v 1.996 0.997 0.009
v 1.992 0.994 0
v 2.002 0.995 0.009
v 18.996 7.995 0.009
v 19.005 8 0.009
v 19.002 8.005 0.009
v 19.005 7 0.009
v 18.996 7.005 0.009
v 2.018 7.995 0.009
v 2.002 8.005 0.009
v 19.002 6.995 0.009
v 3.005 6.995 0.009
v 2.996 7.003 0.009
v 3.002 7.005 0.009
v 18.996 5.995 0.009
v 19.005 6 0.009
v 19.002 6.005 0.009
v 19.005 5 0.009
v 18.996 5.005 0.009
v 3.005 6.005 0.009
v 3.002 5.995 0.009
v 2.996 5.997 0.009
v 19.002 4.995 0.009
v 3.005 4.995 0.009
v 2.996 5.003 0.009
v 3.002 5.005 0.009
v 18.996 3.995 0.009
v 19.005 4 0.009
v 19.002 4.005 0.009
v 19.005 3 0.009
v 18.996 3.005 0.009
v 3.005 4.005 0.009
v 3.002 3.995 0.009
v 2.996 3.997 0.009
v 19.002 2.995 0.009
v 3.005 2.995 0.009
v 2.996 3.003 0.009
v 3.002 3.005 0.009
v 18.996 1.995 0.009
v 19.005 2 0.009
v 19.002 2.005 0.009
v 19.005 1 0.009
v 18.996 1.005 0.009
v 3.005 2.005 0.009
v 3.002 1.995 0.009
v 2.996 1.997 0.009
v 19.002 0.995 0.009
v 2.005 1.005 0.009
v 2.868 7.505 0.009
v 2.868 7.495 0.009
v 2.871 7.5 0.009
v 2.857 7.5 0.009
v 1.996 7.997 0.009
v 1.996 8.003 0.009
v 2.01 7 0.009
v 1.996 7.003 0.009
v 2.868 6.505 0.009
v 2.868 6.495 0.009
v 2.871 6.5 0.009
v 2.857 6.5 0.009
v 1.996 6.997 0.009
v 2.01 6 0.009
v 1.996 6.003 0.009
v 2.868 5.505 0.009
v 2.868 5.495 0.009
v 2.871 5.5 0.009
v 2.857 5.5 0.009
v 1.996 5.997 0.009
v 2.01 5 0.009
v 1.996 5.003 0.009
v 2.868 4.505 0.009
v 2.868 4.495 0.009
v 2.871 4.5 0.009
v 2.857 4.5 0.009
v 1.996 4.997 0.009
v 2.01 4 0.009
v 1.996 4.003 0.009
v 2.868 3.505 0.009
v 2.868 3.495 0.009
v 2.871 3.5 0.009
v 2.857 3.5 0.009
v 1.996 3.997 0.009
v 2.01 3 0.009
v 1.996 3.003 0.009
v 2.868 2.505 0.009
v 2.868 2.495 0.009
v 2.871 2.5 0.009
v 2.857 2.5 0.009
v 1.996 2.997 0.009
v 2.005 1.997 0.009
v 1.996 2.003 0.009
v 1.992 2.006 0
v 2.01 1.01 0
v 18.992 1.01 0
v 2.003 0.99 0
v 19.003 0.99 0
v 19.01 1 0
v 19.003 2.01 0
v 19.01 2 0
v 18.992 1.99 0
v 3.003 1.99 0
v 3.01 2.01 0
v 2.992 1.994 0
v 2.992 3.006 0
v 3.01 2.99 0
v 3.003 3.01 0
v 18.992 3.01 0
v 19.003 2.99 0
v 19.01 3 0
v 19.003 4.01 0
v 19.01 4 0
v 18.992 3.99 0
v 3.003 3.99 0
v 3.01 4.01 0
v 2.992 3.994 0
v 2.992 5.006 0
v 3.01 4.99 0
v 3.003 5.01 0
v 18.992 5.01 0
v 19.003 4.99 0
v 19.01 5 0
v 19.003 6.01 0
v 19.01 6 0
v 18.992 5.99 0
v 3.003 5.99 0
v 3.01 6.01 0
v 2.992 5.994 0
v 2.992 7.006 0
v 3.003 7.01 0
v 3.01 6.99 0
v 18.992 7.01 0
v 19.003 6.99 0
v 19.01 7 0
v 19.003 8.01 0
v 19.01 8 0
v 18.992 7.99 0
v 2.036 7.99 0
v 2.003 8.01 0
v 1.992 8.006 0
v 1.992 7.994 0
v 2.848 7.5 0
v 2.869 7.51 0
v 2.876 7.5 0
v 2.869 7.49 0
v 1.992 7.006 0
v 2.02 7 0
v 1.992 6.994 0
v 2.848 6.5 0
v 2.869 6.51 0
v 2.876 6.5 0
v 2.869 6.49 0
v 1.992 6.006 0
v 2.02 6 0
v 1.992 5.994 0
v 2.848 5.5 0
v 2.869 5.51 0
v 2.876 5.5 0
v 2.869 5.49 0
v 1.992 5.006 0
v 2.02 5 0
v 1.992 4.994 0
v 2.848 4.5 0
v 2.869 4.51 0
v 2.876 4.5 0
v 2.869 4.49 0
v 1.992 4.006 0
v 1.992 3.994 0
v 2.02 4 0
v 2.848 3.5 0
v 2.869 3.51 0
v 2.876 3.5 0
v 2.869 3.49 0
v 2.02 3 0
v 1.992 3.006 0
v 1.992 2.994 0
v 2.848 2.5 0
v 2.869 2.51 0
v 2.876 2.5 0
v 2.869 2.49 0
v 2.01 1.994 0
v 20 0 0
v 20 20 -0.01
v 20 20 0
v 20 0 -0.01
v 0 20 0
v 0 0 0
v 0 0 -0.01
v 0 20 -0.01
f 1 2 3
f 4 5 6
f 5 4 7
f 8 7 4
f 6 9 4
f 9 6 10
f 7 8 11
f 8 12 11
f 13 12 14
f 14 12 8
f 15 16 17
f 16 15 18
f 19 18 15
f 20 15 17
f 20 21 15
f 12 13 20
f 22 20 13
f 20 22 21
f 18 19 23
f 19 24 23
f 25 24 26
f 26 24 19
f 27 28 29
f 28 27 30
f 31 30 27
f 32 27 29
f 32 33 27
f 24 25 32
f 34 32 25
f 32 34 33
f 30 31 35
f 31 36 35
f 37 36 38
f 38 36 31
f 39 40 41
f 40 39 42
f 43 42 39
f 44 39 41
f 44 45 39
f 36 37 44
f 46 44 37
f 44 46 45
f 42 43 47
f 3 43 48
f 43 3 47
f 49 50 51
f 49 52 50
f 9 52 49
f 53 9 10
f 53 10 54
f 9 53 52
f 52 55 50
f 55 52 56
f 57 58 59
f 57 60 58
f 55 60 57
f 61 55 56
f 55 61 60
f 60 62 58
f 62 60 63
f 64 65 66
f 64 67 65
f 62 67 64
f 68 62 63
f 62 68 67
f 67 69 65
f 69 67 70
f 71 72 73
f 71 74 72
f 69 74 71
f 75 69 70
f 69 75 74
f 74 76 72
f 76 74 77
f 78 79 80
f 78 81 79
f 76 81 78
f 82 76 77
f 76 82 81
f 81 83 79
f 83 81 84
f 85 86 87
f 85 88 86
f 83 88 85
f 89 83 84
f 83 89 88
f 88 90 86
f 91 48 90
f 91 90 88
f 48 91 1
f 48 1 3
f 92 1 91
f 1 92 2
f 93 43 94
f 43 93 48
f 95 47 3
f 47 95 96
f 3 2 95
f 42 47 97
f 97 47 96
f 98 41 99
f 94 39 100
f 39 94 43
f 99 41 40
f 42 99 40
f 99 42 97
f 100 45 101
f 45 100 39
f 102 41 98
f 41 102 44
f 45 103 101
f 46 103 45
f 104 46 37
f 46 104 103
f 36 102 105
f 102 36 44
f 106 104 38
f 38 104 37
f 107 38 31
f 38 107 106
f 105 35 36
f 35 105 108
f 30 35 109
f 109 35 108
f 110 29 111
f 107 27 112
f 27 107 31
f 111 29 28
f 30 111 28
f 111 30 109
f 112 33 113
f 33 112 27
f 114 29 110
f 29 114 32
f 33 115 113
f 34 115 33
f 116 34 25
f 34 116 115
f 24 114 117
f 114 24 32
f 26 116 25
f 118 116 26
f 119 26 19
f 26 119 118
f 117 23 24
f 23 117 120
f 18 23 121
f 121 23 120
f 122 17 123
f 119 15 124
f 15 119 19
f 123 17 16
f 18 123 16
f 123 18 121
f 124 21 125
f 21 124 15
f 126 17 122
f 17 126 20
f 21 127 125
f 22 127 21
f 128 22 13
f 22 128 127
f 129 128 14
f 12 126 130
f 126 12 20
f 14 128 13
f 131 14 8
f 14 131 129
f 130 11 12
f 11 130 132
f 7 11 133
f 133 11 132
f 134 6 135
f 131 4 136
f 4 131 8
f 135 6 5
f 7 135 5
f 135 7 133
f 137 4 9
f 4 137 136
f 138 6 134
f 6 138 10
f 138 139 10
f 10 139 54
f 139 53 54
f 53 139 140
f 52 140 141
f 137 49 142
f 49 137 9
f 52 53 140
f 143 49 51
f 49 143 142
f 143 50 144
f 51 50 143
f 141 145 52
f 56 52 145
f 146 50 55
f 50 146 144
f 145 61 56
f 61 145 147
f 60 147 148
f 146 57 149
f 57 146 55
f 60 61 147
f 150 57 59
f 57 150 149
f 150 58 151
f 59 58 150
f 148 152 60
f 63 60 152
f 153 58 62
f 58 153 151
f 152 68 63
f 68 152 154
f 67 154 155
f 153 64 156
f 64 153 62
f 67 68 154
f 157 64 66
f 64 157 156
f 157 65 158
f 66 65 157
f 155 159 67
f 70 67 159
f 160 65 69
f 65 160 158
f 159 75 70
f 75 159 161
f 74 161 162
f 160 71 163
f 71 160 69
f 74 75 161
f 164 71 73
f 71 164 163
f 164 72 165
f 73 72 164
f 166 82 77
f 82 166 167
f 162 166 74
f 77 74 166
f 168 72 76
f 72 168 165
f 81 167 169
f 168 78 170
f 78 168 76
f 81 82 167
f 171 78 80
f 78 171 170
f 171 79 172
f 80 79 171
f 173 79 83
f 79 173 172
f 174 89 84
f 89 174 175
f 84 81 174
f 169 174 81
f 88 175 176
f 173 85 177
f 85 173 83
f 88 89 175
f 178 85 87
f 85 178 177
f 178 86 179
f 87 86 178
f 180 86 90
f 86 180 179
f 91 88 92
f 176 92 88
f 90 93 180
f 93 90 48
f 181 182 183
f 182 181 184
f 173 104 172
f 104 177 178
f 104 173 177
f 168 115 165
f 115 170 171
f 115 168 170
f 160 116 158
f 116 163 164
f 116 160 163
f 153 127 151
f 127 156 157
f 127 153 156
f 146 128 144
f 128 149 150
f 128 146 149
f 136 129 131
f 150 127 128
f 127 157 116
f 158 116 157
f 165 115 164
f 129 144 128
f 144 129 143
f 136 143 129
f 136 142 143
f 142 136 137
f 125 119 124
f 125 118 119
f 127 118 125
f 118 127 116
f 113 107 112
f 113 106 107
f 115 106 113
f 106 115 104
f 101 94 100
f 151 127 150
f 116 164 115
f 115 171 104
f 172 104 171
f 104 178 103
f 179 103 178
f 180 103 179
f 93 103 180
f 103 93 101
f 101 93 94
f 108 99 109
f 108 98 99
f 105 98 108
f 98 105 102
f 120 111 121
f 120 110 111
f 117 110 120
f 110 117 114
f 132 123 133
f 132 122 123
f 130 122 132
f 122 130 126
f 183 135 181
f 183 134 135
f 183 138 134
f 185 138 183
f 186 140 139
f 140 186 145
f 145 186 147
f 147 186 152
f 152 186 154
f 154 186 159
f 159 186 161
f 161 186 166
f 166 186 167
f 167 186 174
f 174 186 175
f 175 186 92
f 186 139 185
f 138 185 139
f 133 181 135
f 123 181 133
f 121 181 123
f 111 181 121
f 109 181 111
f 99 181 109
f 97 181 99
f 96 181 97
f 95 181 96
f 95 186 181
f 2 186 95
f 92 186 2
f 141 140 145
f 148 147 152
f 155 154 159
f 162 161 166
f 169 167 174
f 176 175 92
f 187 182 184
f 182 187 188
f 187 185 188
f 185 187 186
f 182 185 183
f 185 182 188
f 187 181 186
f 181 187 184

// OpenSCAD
hull(){
    translate([2, 1]) sphere(0.01);
    translate([3, 1]) sphere(0.01);
}
hull(){
    translate([3, 1]) sphere(0.01);
    translate([4, 1]) sphere(0.01);
}
hull(){
    translate([4, 1]) sphere(0.01);
    translate([5, 1]) sphere(0.01);
}
hull(){
    translate([5, 1]) sphere(0.01);
    translate([6, 1]) sphere(0.01);
}
hull(){
    translate([6, 1]) sphere(0.01);
    translate([7, 1]) sphere(0.01);
}
hull(){
    translate([7, 1]) sphere(0.01);
    translate([8, 1]) sphere(0.01);
}
hull(){
    translate([8, 1]) sphere(0.01);
    translate([9, 1]) sphere(0.01);
}
hull(){
    translate([9, 1]) sphere(0.01);
    translate([10, 1]) sphere(0.01);
}
hull(){
    translate([10, 1]) sphere(0.01);
    translate([11, 1]) sphere(0.01);
}
hull(){
    translate([11, 1]) sphere(0.01);
    translate([12, 1]) sphere(0.01);
}
hull(){
    translate([12, 1]) sphere(0.01);
    translate([13, 1]) sphere(0.01);
}
hull(){
    translate([13, 1]) sphere(0.01);
    translate([14, 1]) sphere(0.01);
}
hull(){
    translate([14, 1]) sphere(0.01);
    translate([15, 1]) sphere(0.01);
}
hull(){
    translate([15, 1]) sphere(0.01);
    translate([16, 1]) sphere(0.01);
}
hull(){
    translate([16, 1]) sphere(0.01);
    translate([17, 1]) sphere(0.01);
}
hull(){
    translate([17, 1]) sphere(0.01);
    translate([18, 1]) sphere(0.01);
}
hull(){
    translate([18, 1]) sphere(0.01);
    translate([19, 1]) sphere(0.01);
}
hull(){
    translate([19, 1]) sphere(0.01);
    translate([19, 2]) sphere(0.01);
}
hull(){
    translate([19, 2]) sphere(0.01);
    translate([18, 2]) sphere(0.01);
}
hull(){
    translate([18, 2]) sphere(0.01);
    translate([17, 2]) sphere(0.01);
}
hull(){
    translate([17, 2]) sphere(0.01);
    translate([16, 2]) sphere(0.01);
}
hull(){
    translate([16, 2]) sphere(0.01);
    translate([15, 2]) sphere(0.01);
}
hull(){
    translate([15, 2]) sphere(0.01);
    translate([14, 2]) sphere(0.01);
}
hull(){
    translate([14, 2]) sphere(0.01);
    translate([13, 2]) sphere(0.01);
}
hull(){
    translate([13, 2]) sphere(0.01);
    translate([12, 2]) sphere(0.01);
}
hull(){
    translate([12, 2]) sphere(0.01);
    translate([11, 2]) sphere(0.01);
}
hull(){
    translate([11, 2]) sphere(0.01);
    translate([10, 2]) sphere(0.01);
}
hull(){
    translate([10, 2]) sphere(0.01);
    translate([9, 2]) sphere(0.01);
}
hull(){
    translate([9, 2]) sphere(0.01);
    translate([8, 2]) sphere(0.01);
}
hull(){
    translate([8, 2]) sphere(0.01);
    translate([7, 2]) sphere(0.01);
}
hull(){
    translate([7, 2]) sphere(0.01);
    translate([6, 2]) sphere(0.01);
}
hull(){
    translate([6, 2]) sphere(0.01);
    translate([5, 2]) sphere(0.01);
}
hull(){
    translate([5, 2]) sphere(0.01);
    translate([4, 2]) sphere(0.01);
}
hull(){
    translate([4, 2]) sphere(0.01);
    translate([3, 2]) sphere(0.01);
}
hull(){
    translate([3, 2]) sphere(0.01);
    translate([3, 3]) sphere(0.01);
}
hull(){
    translate([3, 3]) sphere(0.01);
    translate([4, 3]) sphere(0.01);
}
hull(){
    translate([4, 3]) sphere(0.01);
    translate([5, 3]) sphere(0.01);
}
hull(){
    translate([5, 3]) sphere(0.01);
    translate([6, 3]) sphere(0.01);
}
hull(){
    translate([6, 3]) sphere(0.01);
    translate([7, 3]) sphere(0.01);
}
hull(){
    translate([7, 3]) sphere(0.01);
    translate([8, 3]) sphere(0.01);
}
hull(){
    translate([8, 3]) sphere(0.01);
    translate([9, 3]) sphere(0.01);
}
hull(){
    translate([9, 3]) sphere(0.01);
    translate([10, 3]) sphere(0.01);
}
hull(){
    translate([10, 3]) sphere(0.01);
    translate([11, 3]) sphere(0.01);
}
hull(){
    translate([11, 3]) sphere(0.01);
    translate([12, 3]) sphere(0.01);
}
hull(){
    translate([12, 3]) sphere(0.01);
    translate([13, 3]) sphere(0.01);
}
hull(){
    translate([13, 3]) sphere(0.01);
    translate([14, 3]) sphere(0.01);
}
hull(){
    translate([14, 3]) sphere(0.01);
    translate([15, 3]) sphere(0.01);
}
hull(){
    translate([15, 3]) sphere(0.01);
    translate([16, 3]) sphere(0.01);
}
hull(){
    translate([16, 3]) sphere(0.01);
    translate([17, 3]) sphere(0.01);
}
hull(){
    translate([17, 3]) sphere(0.01);
    translate([18, 3]) sphere(0.01);
}
hull(){
    translate([18, 3]) sphere(0.01);
    translate([19, 3]) sphere(0.01);
}
hull(){
    translate([19, 3]) sphere(0.01);
    translate([19, 4]) sphere(0.01);
}
hull(){
    translate([19, 4]) sphere(0.01);
    translate([18, 4]) sphere(0.01);
}
hull(){
    translate([18, 4]) sphere(0.01);
    translate([17, 4]) sphere(0.01);
}
hull(){
    translate([17, 4]) sphere(0.01);
    translate([16, 4]) sphere(0.01);
}
hull(){
    translate([16, 4]) sphere(0.01);
    translate([15, 4]) sphere(0.01);
}
hull(){
    translate([15, 4]) sphere(0.01);
    translate([14, 4]) sphere(0.01);
}
hull(){
    translate([14, 4]) sphere(0.01);
    translate([13, 4]) sphere(0.01);
}
hull(){
    translate([13, 4]) sphere(0.01);
    translate([12, 4]) sphere(0.01);
}
hull(){
    translate([12, 4]) sphere(0.01);
    translate([11, 4]) sphere(0.01);
}
hull(){
    translate([11, 4]) sphere(0.01);
    translate([10, 4]) sphere(0.01);
}
hull(){
    translate([10, 4]) sphere(0.01);
    translate([9, 4]) sphere(0.01);
}
hull(){
    translate([9, 4]) sphere(0.01);
    translate([8, 4]) sphere(0.01);
}
hull(){
    translate([8, 4]) sphere(0.01);
    translate([7, 4]) sphere(0.01);
}
hull(){
    translate([7, 4]) sphere(0.01);
    translate([6, 4]) sphere(0.01);
}
hull(){
    translate([6, 4]) sphere(0.01);
    translate([5, 4]) sphere(0.01);
}
hull(){
    translate([5, 4]) sphere(0.01);
    translate([4, 4]) sphere(0.01);
}
hull(){
    translate([4, 4]) sphere(0.01);
    translate([3, 4]) sphere(0.01);
}
hull(){
    translate([3, 4]) sphere(0.01);
    translate([3, 5]) sphere(0.01);
}
hull(){
    translate([3, 5]) sphere(0.01);
    translate([4, 5]) sphere(0.01);
}
hull(){
    translate([4, 5]) sphere(0.01);
    translate([5, 5]) sphere(0.01);
}
hull(){
    translate([5, 5]) sphere(0.01);
    translate([6, 5]) sphere(0.01);
}
hull(){
    translate([6, 5]) sphere(0.01);
    translate([7, 5]) sphere(0.01);
}
hull(){
    translate([7, 5]) sphere(0.01);
    translate([8, 5]) sphere(0.01);
}
hull(){
    translate([8, 5]) sphere(0.01);
    translate([9, 5]) sphere(0.01);
}
hull(){
    translate([9, 5]) sphere(0.01);
    translate([10, 5]) sphere(0.01);
}
hull(){
    translate([10, 5]) sphere(0.01);
    translate([11, 5]) sphere(0.01);
}
hull(){
    translate([11, 5]) sphere(0.01);
    translate([12, 5]) sphere(0.01);
}
hull(){
    translate([12, 5]) sphere(0.01);
    translate([13, 5]) sphere(0.01);
}
hull(){
    translate([13, 5]) sphere(0.01);
    translate([14, 5]) sphere(0.01);
}
hull(){
    translate([14, 5]) sphere(0.01);
    translate([15, 5]) sphere(0.01);
}
hull(){
    translate([15, 5]) sphere(0.01);
    translate([16, 5]) sphere(0.01);
}
hull(){
    translate([16, 5]) sphere(0.01);
    translate([17, 5]) sphere(0.01);
}
hull(){
    translate([17, 5]) sphere(0.01);
    translate([18, 5]) sphere(0.01);
}
hull(){
    translate([18, 5]) sphere(0.01);
    translate([19, 5]) sphere(0.01);
}
hull(){
    translate([19, 5]) sphere(0.01);
    translate([19, 6]) sphere(0.01);
}
hull(){
    translate([19, 6]) sphere(0.01);
    translate([18, 6]) sphere(0.01);
}
hull(){
    translate([18, 6]) sphere(0.01);
    translate([17, 6]) sphere(0.01);
}
hull(){
    translate([17, 6]) sphere(0.01);
    translate([16, 6]) sphere(0.01);
}
hull(){
    translate([16, 6]) sphere(0.01);
    translate([15, 6]) sphere(0.01);
}
hull(){
    translate([15, 6]) sphere(0.01);
    translate([14, 6]) sphere(0.01);
}
hull(){
    translate([14, 6]) sphere(0.01);
    translate([13, 6]) sphere(0.01);
}
hull(){
    translate([13, 6]) sphere(0.01);
    translate([12, 6]) sphere(0.01);
}
hull(){
    translate([12, 6]) sphere(0.01);
    translate([11, 6]) sphere(0.01);
}
hull(){
    translate([11, 6]) sphere(0.01);
    translate([10, 6]) sphere(0.01);
}
hull(){
    translate([10, 6]) sphere(0.01);
    translate([9, 6]) sphere(0.01);
}
hull(){
    translate([9, 6]) sphere(0.01);
    translate([8, 6]) sphere(0.01);
}
hull(){
    translate([8, 6]) sphere(0.01);
    translate([7, 6]) sphere(0.01);
}
hull(){
    translate([7, 6]) sphere(0.01);
    translate([6, 6]) sphere(0.01);
}
hull(){
    translate([6, 6]) sphere(0.01);
    translate([5, 6]) sphere(0.01);
}
hull(){
    translate([5, 6]) sphere(0.01);
    translate([4, 6]) sphere(0.01);
}
hull(){
    translate([4, 6]) sphere(0.01);
    translate([3, 6]) sphere(0.01);
}
hull(){
    translate([3, 6]) sphere(0.01);
    translate([3, 7]) sphere(0.01);
}
hull(){
    translate([3, 7]) sphere(0.01);
    translate([4, 7]) sphere(0.01);
}
hull(){
    translate([4, 7]) sphere(0.01);
    translate([5, 7]) sphere(0.01);
}
hull(){
    translate([5, 7]) sphere(0.01);
    translate([6, 7]) sphere(0.01);
}
hull(){
    translate([6, 7]) sphere(0.01);
    translate([7, 7]) sphere(0.01);
}
hull(){
    translate([7, 7]) sphere(0.01);
    translate([8, 7]) sphere(0.01);
}
hull(){
    translate([8, 7]) sphere(0.01);
    translate([9, 7]) sphere(0.01);
}
hull(){
    translate([9, 7]) sphere(0.01);
    translate([10, 7]) sphere(0.01);
}
hull(){
    translate([10, 7]) sphere(0.01);
    translate([11, 7]) sphere(0.01);
}
hull(){
    translate([11, 7]) sphere(0.01);
    translate([12, 7]) sphere(0.01);
}
hull(){
    translate([12, 7]) sphere(0.01);
    translate([13, 7]) sphere(0.01);
}
hull(){
    translate([13, 7]) sphere(0.01);
    translate([14, 7]) sphere(0.01);
}
hull(){
    translate([14, 7]) sphere(0.01);
    translate([15, 7]) sphere(0.01);
}
hull(){
    translate([15, 7]) sphere(0.01);
    translate([16, 7]) sphere(0.01);
}
hull(){
    translate([16, 7]) sphere(0.01);
    translate([17, 7]) sphere(0.01);
}
hull(){
    translate([17, 7]) sphere(0.01);
    translate([18, 7]) sphere(0.01);
}
hull(){
    translate([18, 7]) sphere(0.01);
    translate([19, 7]) sphere(0.01);
}
hull(){
    translate([19, 7]) sphere(0.01);
    translate([19, 8]) sphere(0.01);
}
hull(){
    translate([19, 8]) sphere(0.01);
    translate([18, 8]) sphere(0.01);
}
hull(){
    translate([18, 8]) sphere(0.01);
    translate([17, 8]) sphere(0.01);
}
hull(){
    translate([17, 8]) sphere(0.01);
    translate([16, 8]) sphere(0.01);
}
hull(){
    translate([16, 8]) sphere(0.01);
    translate([15, 8]) sphere(0.01);
}
hull(){
    translate([15, 8]) sphere(0.01);
    translate([14, 8]) sphere(0.01);
}
hull(){
    translate([14, 8]) sphere(0.01);
    translate([13, 8]) sphere(0.01);
}
hull(){
    translate([13, 8]) sphere(0.01);
    translate([12, 8]) sphere(0.01);
}
hull(){
    translate([12, 8]) sphere(0.01);
    translate([11, 8]) sphere(0.01);
}
hull(){
    translate([11, 8]) sphere(0.01);
    translate([10, 8]) sphere(0.01);
}
hull(){
    translate([10, 8]) sphere(0.01);
    translate([9, 8]) sphere(0.01);
}
hull(){
    translate([9, 8]) sphere(0.01);
    translate([8, 8]) sphere(0.01);
}
hull(){
    translate([8, 8]) sphere(0.01);
    translate([7, 8]) sphere(0.01);
}
hull(){
    translate([7, 8]) sphere(0.01);
    translate([6, 8]) sphere(0.01);
}
hull(){
    translate([6, 8]) sphere(0.01);
    translate([5, 8]) sphere(0.01);
}
hull(){
    translate([5, 8]) sphere(0.01);
    translate([4, 8]) sphere(0.01);
}
hull(){
    translate([4, 8]) sphere(0.01);
    translate([3, 8]) sphere(0.01);
}
hull(){
    translate([3, 8]) sphere(0.01);
    translate([2, 8]) sphere(0.01);
}
hull(){
    translate([2, 8]) sphere(0.01);
    translate([2.8660254, 7.5]) sphere(0.01);
}
hull(){
    translate([2.8660254, 7.5]) sphere(0.01);
    translate([2, 7]) sphere(0.01);
}
hull(){
    translate([2, 7]) sphere(0.01);
    translate([2.8660254, 6.5]) sphere(0.01);
}
hull(){
    translate([2.8660254, 6.5]) sphere(0.01);
    translate([2, 6]) sphere(0.01);
}
hull(){
    translate([2, 6]) sphere(0.01);
    translate([2.8660254, 5.5]) sphere(0.01);
}
hull(){
    translate([2.8660254, 5.5]) sphere(0.01);
    translate([2, 5]) sphere(0.01);
}
hull(){
    translate([2, 5]) sphere(0.01);
    translate([2.8660254, 4.5]) sphere(0.01);
}
hull(){
    translate([2.8660254, 4.5]) sphere(0.01);
    translate([2, 4]) sphere(0.01);
}
hull(){
    translate([2, 4]) sphere(0.01);
    translate([2.8660254, 3.5]) sphere(0.01);
}
hull(){
    translate([2.8660254, 3.5]) sphere(0.01);
    translate([2, 3]) sphere(0.01);
}
hull(){
    translate([2, 3]) sphere(0.01);
    translate([2.8660254, 2.5]) sphere(0.01);
}
hull(){
    translate([2.8660254, 2.5]) sphere(0.01);
    translate([2, 2]) sphere(0.01);
}
hull(){
    translate([2, 2]) sphere(0.01);
    translate([2, 1]) sphere(0.01);
}
translate([0,0,-0.01]) color([0.1,0.1,0.1]) cube([20,20,0.01]);
